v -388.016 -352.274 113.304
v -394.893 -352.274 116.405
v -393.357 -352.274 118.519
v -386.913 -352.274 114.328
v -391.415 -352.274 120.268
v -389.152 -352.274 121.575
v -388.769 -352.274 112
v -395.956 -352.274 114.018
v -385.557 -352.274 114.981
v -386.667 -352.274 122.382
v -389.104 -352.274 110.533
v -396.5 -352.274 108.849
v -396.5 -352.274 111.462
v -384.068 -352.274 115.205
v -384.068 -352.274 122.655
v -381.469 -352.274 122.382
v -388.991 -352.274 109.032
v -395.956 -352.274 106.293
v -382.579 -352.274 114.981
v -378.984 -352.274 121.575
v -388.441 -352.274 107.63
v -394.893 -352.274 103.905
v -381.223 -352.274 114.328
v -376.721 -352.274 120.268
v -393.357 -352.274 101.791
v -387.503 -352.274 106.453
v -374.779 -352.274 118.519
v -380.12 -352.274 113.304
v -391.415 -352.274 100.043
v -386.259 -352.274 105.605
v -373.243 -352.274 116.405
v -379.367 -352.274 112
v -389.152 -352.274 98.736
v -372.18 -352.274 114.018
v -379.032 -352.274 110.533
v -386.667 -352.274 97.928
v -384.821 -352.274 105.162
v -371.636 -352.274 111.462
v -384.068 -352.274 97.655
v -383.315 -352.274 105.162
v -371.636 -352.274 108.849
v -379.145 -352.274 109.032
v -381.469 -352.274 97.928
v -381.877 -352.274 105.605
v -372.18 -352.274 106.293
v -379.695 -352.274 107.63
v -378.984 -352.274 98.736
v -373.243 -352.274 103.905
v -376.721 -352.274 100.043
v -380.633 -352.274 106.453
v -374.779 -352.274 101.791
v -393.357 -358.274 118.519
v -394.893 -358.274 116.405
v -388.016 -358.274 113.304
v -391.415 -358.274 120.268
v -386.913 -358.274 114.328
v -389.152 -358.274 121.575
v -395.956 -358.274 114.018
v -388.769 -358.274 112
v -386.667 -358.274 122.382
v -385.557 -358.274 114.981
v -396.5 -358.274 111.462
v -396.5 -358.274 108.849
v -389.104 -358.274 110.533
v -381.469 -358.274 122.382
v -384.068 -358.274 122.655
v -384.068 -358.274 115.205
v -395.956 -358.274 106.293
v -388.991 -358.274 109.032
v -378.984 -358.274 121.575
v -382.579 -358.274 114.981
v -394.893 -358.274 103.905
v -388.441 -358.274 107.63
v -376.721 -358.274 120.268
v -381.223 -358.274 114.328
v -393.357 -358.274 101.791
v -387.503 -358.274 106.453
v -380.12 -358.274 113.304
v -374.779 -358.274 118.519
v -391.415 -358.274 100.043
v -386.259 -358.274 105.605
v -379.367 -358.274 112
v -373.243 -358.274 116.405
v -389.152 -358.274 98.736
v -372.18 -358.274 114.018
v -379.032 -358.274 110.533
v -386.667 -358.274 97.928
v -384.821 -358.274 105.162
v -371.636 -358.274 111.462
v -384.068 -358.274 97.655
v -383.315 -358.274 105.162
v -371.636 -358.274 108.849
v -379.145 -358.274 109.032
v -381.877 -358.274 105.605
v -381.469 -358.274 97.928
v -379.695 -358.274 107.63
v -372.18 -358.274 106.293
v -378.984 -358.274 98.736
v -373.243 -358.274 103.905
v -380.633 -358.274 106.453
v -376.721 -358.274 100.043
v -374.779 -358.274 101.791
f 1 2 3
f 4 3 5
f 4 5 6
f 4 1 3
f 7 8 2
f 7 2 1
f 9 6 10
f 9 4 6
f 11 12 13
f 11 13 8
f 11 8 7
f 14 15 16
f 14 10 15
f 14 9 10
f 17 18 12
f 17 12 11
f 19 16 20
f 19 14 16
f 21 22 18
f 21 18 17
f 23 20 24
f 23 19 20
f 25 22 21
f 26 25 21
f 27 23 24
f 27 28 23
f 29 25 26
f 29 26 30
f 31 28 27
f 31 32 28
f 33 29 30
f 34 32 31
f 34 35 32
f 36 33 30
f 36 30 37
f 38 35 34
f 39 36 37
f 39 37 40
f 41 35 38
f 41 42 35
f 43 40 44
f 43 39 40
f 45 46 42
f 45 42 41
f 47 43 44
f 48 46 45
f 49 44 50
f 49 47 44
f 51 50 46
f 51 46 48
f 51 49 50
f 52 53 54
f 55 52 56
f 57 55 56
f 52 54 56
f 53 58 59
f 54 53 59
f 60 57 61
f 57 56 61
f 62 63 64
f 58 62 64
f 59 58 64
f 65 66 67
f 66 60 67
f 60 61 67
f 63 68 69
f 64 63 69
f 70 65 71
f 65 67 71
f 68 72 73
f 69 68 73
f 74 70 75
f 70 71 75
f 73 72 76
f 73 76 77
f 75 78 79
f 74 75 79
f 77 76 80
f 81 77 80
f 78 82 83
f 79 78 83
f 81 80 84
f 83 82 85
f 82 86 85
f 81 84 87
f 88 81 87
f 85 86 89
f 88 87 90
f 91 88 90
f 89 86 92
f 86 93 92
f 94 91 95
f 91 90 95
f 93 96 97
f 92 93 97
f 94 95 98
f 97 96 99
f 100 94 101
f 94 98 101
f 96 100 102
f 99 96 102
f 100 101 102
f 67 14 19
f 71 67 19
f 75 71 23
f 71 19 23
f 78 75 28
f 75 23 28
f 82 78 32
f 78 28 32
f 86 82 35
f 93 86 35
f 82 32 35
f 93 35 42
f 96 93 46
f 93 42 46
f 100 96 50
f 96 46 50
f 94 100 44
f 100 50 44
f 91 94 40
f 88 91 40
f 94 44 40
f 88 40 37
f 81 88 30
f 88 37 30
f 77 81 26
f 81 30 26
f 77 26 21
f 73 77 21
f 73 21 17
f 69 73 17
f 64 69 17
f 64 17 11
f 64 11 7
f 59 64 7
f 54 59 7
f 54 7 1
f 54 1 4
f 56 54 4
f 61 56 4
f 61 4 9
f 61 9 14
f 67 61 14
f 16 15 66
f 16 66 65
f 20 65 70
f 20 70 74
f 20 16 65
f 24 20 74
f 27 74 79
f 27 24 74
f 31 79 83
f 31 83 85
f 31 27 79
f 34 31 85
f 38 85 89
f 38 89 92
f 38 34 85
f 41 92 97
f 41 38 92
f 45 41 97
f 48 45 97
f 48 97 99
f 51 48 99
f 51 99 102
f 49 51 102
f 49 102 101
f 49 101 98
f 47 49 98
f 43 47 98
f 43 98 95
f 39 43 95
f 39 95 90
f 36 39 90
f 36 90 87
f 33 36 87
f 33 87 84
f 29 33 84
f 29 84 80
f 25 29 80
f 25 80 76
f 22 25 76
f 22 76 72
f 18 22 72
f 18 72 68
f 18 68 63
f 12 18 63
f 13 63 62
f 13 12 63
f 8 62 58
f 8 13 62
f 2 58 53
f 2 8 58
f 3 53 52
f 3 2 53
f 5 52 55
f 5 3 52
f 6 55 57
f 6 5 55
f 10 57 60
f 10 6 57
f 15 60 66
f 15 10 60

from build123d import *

# Parameters (mm, degrees)
DODANIE_WYCI_GNI_CIE1_DEPTH = 6
SZKIC3_R                    = 5.05
WYTNIJ_WYCI_GNI_CIE1_DEPTH  = 418.898779611
SZKIC4_OUTSIDE_W            = 37.616
SZKIC4_OUTSIDE_H            = 51.616
SZKIC4_OUTSIDE_R            = 12.5
WYTNIJ_WYCI_GNI_CIE2_DEPTH  = 10


with BuildPart() as part:
    # Szkic1 → Dodanie-wyciągnięcie1 (new body)
    with BuildSketch(Plane(origin=(0, -358.273993717, 0), x_dir=(1, 0, 0), z_dir=(0, 1, 0))):
        with BuildLine():
            Line((-393.068007623, -130.155243162), (-375.068007623, -130.155243162))
            ThreePointArc((-375.068007623, -130.155243162), (-372.239580498, -128.983670286), (-371.068007623, -126.155243162))
            Line((-371.068007623, -126.155243162), (-371.068007623, -94.155243162))
            ThreePointArc((-371.068007623, -94.155243162), (-372.239580498, -91.326816037), (-375.068007623, -90.155243162))
            Line((-375.068007623, -90.155243162), (-393.068007623, -90.155243162))
            ThreePointArc((-393.068007623, -90.155243162), (-395.896434748, -91.326816037), (-397.068007623, -94.155243162))
            Line((-397.068007623, -94.155243162), (-397.068007623, -126.155243162))
            ThreePointArc((-397.068007623, -126.155243162), (-395.896434748, -128.983670286), (-393.068007623, -130.155243162))
        make_face()
    extrude(amount=DODANIE_WYCI_GNI_CIE1_DEPTH)

    # Szkic3 → Wytnij-wyciągnięcie1 (cut, through all)
    with BuildSketch(Plane(origin=(0, -352.273993717, 0), x_dir=(1, 0, 0), z_dir=(0, 1, 0))):
        with Locations(Location((-384.068007623, -110.155243162, 0), (0, 0, 270))):
            Circle(SZKIC3_R)
    extrude(amount=-WYTNIJ_WYCI_GNI_CIE1_DEPTH, mode=Mode.SUBTRACT)

    # Szkic4 outside → Wytnij-wyciągnięcie2 (cut)
    with BuildSketch(Plane(origin=(0, -352.273993717, 0), x_dir=(1, 0, 0), z_dir=(0, 1, 0))):
        with Locations((-384.068, -110.155)):
            Rectangle(SZKIC4_OUTSIDE_W, SZKIC4_OUTSIDE_H)
        with Locations(Location((-384.068007623, -110.155243162, 0), (0, 0, 270))):
            Circle(SZKIC4_OUTSIDE_R, mode=Mode.SUBTRACT)
    extrude(amount=-WYTNIJ_WYCI_GNI_CIE2_DEPTH, mode=Mode.SUBTRACT)


solid = part.part
